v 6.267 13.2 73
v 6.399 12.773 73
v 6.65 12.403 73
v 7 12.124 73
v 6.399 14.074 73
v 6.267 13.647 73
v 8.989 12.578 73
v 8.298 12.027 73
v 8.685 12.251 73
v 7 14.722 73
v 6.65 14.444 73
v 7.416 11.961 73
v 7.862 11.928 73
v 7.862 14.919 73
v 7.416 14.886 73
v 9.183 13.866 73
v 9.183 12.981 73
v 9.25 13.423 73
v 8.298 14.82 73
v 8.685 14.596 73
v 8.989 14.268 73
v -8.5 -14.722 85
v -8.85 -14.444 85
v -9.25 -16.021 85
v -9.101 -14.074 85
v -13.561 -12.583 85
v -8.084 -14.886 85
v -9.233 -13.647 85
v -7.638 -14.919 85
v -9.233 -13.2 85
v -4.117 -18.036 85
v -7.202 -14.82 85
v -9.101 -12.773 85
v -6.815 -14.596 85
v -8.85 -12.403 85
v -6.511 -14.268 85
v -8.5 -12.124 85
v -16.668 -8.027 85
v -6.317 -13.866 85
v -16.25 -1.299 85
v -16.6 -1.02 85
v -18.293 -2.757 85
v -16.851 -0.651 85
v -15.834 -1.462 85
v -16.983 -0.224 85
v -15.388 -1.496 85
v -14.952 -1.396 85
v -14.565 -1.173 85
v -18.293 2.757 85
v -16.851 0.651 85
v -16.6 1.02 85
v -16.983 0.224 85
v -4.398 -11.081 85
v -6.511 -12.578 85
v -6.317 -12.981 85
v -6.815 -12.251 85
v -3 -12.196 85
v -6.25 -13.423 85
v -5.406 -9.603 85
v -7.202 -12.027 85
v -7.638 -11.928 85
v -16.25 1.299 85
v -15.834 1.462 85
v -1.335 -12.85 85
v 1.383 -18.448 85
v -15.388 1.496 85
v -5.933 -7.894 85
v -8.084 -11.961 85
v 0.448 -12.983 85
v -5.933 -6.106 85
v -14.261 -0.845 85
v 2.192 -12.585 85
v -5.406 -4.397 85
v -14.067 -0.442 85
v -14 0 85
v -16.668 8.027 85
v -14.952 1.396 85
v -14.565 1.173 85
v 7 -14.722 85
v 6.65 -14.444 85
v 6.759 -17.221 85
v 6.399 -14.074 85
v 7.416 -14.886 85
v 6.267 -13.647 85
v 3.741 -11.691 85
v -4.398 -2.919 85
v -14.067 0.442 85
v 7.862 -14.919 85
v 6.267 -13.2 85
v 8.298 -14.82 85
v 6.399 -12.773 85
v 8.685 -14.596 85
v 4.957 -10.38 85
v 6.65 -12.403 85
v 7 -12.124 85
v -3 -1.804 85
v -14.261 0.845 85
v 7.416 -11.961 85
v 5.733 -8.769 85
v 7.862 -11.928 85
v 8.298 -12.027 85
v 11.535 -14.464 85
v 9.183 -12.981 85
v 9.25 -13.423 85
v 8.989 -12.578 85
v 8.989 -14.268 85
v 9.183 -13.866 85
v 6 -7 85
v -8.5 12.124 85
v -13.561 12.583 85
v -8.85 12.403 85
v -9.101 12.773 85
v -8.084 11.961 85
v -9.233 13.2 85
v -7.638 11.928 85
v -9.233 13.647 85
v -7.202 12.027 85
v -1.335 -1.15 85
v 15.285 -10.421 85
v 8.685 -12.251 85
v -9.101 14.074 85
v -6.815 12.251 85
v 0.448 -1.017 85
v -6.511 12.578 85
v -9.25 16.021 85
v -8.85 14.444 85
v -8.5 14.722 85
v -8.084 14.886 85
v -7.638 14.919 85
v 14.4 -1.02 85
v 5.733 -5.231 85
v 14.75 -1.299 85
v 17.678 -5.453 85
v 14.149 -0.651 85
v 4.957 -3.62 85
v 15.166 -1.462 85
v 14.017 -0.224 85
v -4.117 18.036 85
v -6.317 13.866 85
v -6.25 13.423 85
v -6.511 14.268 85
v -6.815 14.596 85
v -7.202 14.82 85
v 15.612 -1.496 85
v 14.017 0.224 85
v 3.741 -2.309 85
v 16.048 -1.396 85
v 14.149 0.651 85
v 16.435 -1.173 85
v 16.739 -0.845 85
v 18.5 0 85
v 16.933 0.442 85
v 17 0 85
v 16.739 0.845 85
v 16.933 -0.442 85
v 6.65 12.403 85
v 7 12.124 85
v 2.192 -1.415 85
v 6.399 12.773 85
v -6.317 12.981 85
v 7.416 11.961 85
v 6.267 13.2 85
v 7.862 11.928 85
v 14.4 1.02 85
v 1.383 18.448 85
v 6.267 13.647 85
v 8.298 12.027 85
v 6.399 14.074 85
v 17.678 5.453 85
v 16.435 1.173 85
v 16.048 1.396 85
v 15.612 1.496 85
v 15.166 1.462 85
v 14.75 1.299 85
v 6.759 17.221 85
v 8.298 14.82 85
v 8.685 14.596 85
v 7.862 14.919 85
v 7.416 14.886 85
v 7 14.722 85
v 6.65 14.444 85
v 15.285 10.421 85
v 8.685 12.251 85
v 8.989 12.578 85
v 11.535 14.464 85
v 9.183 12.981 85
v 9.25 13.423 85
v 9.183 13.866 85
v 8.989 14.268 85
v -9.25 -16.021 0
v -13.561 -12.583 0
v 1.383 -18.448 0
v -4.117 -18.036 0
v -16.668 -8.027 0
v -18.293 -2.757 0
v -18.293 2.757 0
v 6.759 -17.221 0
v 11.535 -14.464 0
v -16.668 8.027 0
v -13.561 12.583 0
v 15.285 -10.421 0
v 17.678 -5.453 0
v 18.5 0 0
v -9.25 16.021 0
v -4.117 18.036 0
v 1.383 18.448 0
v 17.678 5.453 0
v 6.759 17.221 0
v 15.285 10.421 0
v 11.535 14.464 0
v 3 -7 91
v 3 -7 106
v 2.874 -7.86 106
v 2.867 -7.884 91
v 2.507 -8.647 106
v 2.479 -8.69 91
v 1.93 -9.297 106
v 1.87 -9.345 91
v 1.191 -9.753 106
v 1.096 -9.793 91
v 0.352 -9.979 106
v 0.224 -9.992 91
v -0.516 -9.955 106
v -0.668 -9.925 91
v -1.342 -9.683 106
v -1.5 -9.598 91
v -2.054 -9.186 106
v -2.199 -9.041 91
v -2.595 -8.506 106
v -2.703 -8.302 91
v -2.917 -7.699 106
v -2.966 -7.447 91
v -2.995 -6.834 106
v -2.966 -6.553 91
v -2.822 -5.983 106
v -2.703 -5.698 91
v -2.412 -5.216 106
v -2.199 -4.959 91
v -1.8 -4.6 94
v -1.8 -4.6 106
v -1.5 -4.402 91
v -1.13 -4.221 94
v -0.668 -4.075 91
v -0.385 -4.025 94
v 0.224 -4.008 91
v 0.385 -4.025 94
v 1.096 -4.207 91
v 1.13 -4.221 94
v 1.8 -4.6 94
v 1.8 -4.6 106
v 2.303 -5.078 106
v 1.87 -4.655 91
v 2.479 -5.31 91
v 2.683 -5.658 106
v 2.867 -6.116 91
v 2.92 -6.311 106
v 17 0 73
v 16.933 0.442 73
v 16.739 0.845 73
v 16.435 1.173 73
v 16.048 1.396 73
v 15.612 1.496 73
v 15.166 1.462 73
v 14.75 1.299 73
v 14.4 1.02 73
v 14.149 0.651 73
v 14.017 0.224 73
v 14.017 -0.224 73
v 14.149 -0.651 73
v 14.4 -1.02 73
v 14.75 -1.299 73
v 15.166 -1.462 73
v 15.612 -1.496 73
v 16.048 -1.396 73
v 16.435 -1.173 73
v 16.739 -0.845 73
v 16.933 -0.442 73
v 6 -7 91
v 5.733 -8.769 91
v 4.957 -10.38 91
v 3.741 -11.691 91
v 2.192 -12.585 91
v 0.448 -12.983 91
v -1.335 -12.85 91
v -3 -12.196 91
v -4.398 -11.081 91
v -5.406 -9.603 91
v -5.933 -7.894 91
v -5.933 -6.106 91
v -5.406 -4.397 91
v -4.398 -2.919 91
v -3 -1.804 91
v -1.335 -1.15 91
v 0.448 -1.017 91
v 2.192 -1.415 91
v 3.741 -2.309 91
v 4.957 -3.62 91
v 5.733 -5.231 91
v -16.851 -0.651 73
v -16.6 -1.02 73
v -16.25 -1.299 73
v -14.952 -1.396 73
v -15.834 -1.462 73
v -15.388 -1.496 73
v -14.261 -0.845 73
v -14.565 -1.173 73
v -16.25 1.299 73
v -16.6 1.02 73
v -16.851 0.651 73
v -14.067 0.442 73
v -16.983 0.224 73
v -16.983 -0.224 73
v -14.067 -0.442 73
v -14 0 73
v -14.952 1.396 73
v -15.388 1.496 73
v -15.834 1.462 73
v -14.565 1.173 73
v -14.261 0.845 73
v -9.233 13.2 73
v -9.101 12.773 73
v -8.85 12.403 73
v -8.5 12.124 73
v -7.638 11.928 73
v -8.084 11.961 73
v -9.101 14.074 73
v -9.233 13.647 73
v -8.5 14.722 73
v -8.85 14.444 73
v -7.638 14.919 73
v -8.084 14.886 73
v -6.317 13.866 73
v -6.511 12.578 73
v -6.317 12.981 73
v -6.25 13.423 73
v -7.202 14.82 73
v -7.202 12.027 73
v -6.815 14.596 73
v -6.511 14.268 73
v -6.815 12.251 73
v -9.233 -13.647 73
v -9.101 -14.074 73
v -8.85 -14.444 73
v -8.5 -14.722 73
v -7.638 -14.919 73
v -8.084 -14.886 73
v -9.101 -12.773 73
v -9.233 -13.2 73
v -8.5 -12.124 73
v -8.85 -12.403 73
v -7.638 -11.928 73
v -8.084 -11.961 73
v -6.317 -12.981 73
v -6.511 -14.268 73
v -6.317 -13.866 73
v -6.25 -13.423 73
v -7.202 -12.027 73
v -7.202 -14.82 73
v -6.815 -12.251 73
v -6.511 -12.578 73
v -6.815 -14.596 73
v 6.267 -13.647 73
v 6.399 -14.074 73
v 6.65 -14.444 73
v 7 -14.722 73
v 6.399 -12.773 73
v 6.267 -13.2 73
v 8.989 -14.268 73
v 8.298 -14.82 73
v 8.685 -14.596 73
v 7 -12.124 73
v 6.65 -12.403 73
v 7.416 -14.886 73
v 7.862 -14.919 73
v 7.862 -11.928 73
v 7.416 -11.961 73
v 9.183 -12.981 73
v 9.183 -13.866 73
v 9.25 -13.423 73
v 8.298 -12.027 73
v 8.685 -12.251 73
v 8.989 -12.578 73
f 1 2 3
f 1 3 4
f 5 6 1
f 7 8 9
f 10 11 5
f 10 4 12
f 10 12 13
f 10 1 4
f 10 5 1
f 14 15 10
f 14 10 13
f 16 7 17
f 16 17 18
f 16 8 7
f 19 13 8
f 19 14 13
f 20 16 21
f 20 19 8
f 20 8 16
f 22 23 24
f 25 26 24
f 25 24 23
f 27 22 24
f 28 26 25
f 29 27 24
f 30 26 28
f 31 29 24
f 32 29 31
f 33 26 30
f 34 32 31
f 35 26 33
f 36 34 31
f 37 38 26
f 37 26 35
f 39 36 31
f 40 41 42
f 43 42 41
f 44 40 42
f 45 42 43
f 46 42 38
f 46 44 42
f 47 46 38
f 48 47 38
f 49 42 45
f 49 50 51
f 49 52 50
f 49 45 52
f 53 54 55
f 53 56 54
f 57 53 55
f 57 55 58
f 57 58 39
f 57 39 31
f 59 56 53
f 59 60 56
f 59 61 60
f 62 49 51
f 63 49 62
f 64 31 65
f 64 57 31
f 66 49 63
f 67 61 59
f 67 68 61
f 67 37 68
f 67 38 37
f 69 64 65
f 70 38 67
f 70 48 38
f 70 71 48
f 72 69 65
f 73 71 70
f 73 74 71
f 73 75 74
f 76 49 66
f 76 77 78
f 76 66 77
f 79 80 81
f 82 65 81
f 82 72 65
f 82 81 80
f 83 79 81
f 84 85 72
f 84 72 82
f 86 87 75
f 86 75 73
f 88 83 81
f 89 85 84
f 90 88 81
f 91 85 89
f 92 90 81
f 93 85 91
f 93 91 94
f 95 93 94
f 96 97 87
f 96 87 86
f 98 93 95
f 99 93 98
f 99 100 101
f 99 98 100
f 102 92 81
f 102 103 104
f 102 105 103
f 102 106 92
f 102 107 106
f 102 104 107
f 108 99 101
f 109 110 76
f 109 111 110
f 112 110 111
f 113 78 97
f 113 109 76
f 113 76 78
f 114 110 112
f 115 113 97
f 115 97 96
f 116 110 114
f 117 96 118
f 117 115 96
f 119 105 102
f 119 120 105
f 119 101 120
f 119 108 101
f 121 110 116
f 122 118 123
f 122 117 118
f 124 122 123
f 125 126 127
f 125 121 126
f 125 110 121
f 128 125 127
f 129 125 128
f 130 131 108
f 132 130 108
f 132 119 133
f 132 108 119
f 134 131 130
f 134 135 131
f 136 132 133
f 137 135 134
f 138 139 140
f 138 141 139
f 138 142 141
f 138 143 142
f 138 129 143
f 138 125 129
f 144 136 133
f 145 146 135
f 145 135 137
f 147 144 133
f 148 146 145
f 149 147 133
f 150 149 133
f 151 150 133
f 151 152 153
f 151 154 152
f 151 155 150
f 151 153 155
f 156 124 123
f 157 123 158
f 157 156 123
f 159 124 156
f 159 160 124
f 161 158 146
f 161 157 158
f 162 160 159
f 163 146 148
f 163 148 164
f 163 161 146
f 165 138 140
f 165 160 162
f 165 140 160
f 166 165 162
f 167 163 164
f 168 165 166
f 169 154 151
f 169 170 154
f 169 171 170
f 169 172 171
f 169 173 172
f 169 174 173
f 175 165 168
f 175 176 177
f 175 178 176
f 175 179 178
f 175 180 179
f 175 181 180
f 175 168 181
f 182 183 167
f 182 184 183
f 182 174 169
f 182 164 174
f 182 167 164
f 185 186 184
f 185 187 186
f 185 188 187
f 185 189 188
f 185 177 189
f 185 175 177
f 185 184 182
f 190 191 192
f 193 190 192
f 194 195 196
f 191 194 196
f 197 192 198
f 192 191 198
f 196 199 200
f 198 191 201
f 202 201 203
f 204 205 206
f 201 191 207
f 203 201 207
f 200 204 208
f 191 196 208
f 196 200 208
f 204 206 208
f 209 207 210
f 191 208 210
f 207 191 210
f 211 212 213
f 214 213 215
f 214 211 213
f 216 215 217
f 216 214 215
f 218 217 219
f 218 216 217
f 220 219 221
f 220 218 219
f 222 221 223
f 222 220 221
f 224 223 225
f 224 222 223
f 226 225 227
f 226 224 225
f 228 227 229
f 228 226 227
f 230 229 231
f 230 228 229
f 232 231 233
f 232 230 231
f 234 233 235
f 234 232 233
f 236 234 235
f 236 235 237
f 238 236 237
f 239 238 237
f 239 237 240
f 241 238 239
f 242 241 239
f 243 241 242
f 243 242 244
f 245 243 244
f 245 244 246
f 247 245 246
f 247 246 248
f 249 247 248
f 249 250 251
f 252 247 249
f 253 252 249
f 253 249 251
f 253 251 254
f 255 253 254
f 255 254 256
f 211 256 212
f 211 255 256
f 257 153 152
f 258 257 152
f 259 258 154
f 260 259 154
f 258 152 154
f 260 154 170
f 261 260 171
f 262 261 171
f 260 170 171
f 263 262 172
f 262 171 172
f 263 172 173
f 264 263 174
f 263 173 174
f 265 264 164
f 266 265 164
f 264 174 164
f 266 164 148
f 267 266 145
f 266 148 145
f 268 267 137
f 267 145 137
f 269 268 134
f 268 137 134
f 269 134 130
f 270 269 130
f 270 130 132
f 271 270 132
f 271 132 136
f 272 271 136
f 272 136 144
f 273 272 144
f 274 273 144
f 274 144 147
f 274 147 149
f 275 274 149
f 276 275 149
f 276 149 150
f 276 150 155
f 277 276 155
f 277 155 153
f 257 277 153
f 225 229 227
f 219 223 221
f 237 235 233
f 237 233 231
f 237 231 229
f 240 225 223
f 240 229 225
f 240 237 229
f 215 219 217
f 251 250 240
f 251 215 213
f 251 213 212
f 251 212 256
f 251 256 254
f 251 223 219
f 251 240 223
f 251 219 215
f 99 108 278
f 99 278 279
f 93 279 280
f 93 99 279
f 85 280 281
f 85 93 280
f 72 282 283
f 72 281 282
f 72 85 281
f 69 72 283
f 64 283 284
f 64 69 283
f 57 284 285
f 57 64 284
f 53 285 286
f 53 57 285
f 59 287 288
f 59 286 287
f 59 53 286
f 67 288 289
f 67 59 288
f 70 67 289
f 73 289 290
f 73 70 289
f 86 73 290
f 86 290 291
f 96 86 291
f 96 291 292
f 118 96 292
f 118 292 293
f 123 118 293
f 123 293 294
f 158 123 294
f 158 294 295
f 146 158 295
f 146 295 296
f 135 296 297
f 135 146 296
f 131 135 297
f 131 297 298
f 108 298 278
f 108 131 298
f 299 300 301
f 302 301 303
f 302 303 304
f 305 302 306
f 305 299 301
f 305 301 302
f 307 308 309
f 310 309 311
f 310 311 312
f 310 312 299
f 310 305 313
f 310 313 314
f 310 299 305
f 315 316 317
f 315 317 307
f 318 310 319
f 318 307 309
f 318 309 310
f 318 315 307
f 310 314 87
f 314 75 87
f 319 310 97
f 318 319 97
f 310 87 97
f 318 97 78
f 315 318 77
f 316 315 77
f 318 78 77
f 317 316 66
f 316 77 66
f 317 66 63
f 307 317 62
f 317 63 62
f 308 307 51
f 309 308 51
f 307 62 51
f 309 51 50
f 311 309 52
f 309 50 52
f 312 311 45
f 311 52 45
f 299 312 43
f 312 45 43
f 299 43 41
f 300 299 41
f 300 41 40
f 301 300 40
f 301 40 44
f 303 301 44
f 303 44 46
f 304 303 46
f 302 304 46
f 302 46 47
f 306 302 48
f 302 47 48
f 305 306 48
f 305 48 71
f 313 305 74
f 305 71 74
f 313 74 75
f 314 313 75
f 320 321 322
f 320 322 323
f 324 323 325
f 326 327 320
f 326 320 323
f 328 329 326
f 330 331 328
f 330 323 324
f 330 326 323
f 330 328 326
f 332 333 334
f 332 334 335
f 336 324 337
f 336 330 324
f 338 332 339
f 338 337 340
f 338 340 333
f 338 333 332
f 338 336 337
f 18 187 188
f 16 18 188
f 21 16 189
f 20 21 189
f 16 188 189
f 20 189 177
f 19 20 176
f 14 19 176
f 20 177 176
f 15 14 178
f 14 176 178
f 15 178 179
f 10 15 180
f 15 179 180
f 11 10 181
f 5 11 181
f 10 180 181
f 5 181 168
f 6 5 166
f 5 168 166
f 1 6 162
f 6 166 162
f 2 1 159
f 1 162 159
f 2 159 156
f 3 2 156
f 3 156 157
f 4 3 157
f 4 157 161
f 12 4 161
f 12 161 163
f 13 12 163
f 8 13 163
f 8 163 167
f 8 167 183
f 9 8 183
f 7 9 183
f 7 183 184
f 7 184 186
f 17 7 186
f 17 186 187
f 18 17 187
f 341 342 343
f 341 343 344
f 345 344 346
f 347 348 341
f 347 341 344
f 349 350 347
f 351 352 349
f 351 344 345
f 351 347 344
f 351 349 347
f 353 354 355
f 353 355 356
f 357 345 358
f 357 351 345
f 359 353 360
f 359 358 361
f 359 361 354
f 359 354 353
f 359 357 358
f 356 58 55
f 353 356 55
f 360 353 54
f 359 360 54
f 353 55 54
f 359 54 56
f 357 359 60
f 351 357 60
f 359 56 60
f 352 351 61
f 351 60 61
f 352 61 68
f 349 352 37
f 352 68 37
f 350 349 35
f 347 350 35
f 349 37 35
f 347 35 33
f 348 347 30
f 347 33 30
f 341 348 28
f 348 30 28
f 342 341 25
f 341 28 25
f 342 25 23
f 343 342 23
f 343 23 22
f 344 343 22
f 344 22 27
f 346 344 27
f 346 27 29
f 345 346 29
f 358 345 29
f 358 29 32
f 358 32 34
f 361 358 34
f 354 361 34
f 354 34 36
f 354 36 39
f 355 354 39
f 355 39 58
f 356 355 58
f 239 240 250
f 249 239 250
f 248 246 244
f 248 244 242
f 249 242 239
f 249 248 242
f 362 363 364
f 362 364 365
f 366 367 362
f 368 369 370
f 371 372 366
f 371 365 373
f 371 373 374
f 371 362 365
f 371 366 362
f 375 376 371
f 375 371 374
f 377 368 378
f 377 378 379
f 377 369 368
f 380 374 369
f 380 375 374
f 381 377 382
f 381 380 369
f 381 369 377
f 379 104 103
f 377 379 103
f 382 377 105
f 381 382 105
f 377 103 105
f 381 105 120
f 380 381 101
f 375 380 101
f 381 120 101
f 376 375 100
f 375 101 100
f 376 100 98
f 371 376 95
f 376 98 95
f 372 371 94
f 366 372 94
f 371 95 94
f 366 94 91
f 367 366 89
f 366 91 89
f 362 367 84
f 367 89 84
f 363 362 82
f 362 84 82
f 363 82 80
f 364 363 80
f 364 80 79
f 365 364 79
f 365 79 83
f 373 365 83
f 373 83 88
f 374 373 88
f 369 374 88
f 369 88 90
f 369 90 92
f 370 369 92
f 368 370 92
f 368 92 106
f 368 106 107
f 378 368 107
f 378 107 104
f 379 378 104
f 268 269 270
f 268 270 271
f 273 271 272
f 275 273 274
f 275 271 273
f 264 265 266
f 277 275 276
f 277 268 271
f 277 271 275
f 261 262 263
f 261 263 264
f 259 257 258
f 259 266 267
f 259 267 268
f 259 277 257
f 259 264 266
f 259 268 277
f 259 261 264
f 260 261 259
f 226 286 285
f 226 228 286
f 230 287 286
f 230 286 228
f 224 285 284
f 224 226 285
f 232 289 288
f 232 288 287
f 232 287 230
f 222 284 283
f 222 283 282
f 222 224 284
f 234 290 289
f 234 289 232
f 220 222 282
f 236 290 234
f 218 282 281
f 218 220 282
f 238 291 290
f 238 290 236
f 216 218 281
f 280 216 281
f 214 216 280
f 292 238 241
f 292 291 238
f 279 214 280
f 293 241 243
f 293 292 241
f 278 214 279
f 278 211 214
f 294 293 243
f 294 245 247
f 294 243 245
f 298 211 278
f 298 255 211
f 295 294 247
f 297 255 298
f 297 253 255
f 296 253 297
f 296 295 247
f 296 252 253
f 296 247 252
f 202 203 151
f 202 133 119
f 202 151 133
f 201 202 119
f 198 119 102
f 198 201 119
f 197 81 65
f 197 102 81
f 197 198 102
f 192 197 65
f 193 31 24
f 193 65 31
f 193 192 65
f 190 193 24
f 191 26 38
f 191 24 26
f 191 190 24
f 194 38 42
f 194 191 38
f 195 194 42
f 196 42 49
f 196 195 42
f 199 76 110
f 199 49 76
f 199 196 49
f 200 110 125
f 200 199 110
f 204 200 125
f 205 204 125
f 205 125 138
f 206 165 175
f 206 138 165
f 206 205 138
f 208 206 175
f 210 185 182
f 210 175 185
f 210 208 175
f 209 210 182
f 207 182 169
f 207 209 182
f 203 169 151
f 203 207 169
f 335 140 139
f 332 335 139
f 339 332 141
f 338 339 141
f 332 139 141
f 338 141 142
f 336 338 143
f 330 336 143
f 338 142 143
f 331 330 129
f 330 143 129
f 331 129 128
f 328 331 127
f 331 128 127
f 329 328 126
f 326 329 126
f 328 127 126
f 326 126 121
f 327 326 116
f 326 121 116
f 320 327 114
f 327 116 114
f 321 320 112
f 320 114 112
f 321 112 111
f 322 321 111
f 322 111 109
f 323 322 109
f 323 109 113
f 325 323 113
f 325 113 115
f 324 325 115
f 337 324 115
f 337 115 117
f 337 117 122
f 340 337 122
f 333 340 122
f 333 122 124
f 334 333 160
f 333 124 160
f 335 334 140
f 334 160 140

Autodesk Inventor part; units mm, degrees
ref_plane "YZ Plane" through (0, 0, 0) normal (1, 0, 0) x (0, 1, 0)
ref_plane "XZ Plane" through (0, 0, 0) normal (0, 1, 0) x (-1, 0, 0)
ref_plane "XY Plane" through (0, 0, 0) normal (0, 0, 1) x (1, 0, 0)
sketch "Sketch1" plane through (0, 0, 0) normal (0, 0, 1) x (1, 0, 0)
  circle A0 centre (0, 0) radius 18.5
  dimension "d0" = 37
extrude "Extrusion1" add sketch "Sketch1" along normal blind 85
sketch "Sketch2" plane through (0, 0, 85) normal (0, 0, 1) x (1, 0, 0)
  circle A0 centre (0, -7) radius 3
  point P0 (0, 0)
  dimension "d3" = 6
  dimension "d4" = 7
extrude "Extrusion2" add sketch "Sketch2" along normal blind 21
sketch "Sketch3" plane through (0, 0, 85) normal (0, 0, 1) x (1, 0, 0)
  circle A0 centre (0, -7) radius 3 projected
  circle A1 centre (0, -7) radius 6
  point P0 (0, 0)
  dimension "d7" = 12
extrude "Extrusion3" add sketch "Sketch3" along normal blind 6
sketch "Sketch4" plane through (0, -7, 106) normal (0, 0, 1) x (1, 0, 0)
  circle A0 centre (0, 0) radius 3 projected
  line L0 (-1.8, 2.4) -> (1.8, 2.4)
  point P0 (0, 7)
  dimension "d10" = 2.4
extrude "Extrusion4" cut sketch "Sketch4" against normal blind 12 contours L0 A0 picked at (0, 2.6)
sketch "Sketch5" plane through (0, 0, 85) normal (0, 0, 1) x (1, 0, 0)
  circle A0 centre (15.5, 0) radius 1.5
  circle A1 centre (7.75, 13.4234) radius 1.5
  circle A2 centre (-7.75, 13.4234) radius 1.5
  circle A3 centre (-15.5, 0) radius 1.5
  circle A4 centre (-7.75, -13.4234) radius 1.5
  circle A5 centre (7.75, -13.4234) radius 1.5
  point P0 (0, 0)
  dimension "d13" = 3
  dimension "d14" = 15.5
  dimension "d17" = 360
extrude "Extrusion5" cut sketch "Sketch5" against normal blind 12
properties material "Steel, Carbon"
